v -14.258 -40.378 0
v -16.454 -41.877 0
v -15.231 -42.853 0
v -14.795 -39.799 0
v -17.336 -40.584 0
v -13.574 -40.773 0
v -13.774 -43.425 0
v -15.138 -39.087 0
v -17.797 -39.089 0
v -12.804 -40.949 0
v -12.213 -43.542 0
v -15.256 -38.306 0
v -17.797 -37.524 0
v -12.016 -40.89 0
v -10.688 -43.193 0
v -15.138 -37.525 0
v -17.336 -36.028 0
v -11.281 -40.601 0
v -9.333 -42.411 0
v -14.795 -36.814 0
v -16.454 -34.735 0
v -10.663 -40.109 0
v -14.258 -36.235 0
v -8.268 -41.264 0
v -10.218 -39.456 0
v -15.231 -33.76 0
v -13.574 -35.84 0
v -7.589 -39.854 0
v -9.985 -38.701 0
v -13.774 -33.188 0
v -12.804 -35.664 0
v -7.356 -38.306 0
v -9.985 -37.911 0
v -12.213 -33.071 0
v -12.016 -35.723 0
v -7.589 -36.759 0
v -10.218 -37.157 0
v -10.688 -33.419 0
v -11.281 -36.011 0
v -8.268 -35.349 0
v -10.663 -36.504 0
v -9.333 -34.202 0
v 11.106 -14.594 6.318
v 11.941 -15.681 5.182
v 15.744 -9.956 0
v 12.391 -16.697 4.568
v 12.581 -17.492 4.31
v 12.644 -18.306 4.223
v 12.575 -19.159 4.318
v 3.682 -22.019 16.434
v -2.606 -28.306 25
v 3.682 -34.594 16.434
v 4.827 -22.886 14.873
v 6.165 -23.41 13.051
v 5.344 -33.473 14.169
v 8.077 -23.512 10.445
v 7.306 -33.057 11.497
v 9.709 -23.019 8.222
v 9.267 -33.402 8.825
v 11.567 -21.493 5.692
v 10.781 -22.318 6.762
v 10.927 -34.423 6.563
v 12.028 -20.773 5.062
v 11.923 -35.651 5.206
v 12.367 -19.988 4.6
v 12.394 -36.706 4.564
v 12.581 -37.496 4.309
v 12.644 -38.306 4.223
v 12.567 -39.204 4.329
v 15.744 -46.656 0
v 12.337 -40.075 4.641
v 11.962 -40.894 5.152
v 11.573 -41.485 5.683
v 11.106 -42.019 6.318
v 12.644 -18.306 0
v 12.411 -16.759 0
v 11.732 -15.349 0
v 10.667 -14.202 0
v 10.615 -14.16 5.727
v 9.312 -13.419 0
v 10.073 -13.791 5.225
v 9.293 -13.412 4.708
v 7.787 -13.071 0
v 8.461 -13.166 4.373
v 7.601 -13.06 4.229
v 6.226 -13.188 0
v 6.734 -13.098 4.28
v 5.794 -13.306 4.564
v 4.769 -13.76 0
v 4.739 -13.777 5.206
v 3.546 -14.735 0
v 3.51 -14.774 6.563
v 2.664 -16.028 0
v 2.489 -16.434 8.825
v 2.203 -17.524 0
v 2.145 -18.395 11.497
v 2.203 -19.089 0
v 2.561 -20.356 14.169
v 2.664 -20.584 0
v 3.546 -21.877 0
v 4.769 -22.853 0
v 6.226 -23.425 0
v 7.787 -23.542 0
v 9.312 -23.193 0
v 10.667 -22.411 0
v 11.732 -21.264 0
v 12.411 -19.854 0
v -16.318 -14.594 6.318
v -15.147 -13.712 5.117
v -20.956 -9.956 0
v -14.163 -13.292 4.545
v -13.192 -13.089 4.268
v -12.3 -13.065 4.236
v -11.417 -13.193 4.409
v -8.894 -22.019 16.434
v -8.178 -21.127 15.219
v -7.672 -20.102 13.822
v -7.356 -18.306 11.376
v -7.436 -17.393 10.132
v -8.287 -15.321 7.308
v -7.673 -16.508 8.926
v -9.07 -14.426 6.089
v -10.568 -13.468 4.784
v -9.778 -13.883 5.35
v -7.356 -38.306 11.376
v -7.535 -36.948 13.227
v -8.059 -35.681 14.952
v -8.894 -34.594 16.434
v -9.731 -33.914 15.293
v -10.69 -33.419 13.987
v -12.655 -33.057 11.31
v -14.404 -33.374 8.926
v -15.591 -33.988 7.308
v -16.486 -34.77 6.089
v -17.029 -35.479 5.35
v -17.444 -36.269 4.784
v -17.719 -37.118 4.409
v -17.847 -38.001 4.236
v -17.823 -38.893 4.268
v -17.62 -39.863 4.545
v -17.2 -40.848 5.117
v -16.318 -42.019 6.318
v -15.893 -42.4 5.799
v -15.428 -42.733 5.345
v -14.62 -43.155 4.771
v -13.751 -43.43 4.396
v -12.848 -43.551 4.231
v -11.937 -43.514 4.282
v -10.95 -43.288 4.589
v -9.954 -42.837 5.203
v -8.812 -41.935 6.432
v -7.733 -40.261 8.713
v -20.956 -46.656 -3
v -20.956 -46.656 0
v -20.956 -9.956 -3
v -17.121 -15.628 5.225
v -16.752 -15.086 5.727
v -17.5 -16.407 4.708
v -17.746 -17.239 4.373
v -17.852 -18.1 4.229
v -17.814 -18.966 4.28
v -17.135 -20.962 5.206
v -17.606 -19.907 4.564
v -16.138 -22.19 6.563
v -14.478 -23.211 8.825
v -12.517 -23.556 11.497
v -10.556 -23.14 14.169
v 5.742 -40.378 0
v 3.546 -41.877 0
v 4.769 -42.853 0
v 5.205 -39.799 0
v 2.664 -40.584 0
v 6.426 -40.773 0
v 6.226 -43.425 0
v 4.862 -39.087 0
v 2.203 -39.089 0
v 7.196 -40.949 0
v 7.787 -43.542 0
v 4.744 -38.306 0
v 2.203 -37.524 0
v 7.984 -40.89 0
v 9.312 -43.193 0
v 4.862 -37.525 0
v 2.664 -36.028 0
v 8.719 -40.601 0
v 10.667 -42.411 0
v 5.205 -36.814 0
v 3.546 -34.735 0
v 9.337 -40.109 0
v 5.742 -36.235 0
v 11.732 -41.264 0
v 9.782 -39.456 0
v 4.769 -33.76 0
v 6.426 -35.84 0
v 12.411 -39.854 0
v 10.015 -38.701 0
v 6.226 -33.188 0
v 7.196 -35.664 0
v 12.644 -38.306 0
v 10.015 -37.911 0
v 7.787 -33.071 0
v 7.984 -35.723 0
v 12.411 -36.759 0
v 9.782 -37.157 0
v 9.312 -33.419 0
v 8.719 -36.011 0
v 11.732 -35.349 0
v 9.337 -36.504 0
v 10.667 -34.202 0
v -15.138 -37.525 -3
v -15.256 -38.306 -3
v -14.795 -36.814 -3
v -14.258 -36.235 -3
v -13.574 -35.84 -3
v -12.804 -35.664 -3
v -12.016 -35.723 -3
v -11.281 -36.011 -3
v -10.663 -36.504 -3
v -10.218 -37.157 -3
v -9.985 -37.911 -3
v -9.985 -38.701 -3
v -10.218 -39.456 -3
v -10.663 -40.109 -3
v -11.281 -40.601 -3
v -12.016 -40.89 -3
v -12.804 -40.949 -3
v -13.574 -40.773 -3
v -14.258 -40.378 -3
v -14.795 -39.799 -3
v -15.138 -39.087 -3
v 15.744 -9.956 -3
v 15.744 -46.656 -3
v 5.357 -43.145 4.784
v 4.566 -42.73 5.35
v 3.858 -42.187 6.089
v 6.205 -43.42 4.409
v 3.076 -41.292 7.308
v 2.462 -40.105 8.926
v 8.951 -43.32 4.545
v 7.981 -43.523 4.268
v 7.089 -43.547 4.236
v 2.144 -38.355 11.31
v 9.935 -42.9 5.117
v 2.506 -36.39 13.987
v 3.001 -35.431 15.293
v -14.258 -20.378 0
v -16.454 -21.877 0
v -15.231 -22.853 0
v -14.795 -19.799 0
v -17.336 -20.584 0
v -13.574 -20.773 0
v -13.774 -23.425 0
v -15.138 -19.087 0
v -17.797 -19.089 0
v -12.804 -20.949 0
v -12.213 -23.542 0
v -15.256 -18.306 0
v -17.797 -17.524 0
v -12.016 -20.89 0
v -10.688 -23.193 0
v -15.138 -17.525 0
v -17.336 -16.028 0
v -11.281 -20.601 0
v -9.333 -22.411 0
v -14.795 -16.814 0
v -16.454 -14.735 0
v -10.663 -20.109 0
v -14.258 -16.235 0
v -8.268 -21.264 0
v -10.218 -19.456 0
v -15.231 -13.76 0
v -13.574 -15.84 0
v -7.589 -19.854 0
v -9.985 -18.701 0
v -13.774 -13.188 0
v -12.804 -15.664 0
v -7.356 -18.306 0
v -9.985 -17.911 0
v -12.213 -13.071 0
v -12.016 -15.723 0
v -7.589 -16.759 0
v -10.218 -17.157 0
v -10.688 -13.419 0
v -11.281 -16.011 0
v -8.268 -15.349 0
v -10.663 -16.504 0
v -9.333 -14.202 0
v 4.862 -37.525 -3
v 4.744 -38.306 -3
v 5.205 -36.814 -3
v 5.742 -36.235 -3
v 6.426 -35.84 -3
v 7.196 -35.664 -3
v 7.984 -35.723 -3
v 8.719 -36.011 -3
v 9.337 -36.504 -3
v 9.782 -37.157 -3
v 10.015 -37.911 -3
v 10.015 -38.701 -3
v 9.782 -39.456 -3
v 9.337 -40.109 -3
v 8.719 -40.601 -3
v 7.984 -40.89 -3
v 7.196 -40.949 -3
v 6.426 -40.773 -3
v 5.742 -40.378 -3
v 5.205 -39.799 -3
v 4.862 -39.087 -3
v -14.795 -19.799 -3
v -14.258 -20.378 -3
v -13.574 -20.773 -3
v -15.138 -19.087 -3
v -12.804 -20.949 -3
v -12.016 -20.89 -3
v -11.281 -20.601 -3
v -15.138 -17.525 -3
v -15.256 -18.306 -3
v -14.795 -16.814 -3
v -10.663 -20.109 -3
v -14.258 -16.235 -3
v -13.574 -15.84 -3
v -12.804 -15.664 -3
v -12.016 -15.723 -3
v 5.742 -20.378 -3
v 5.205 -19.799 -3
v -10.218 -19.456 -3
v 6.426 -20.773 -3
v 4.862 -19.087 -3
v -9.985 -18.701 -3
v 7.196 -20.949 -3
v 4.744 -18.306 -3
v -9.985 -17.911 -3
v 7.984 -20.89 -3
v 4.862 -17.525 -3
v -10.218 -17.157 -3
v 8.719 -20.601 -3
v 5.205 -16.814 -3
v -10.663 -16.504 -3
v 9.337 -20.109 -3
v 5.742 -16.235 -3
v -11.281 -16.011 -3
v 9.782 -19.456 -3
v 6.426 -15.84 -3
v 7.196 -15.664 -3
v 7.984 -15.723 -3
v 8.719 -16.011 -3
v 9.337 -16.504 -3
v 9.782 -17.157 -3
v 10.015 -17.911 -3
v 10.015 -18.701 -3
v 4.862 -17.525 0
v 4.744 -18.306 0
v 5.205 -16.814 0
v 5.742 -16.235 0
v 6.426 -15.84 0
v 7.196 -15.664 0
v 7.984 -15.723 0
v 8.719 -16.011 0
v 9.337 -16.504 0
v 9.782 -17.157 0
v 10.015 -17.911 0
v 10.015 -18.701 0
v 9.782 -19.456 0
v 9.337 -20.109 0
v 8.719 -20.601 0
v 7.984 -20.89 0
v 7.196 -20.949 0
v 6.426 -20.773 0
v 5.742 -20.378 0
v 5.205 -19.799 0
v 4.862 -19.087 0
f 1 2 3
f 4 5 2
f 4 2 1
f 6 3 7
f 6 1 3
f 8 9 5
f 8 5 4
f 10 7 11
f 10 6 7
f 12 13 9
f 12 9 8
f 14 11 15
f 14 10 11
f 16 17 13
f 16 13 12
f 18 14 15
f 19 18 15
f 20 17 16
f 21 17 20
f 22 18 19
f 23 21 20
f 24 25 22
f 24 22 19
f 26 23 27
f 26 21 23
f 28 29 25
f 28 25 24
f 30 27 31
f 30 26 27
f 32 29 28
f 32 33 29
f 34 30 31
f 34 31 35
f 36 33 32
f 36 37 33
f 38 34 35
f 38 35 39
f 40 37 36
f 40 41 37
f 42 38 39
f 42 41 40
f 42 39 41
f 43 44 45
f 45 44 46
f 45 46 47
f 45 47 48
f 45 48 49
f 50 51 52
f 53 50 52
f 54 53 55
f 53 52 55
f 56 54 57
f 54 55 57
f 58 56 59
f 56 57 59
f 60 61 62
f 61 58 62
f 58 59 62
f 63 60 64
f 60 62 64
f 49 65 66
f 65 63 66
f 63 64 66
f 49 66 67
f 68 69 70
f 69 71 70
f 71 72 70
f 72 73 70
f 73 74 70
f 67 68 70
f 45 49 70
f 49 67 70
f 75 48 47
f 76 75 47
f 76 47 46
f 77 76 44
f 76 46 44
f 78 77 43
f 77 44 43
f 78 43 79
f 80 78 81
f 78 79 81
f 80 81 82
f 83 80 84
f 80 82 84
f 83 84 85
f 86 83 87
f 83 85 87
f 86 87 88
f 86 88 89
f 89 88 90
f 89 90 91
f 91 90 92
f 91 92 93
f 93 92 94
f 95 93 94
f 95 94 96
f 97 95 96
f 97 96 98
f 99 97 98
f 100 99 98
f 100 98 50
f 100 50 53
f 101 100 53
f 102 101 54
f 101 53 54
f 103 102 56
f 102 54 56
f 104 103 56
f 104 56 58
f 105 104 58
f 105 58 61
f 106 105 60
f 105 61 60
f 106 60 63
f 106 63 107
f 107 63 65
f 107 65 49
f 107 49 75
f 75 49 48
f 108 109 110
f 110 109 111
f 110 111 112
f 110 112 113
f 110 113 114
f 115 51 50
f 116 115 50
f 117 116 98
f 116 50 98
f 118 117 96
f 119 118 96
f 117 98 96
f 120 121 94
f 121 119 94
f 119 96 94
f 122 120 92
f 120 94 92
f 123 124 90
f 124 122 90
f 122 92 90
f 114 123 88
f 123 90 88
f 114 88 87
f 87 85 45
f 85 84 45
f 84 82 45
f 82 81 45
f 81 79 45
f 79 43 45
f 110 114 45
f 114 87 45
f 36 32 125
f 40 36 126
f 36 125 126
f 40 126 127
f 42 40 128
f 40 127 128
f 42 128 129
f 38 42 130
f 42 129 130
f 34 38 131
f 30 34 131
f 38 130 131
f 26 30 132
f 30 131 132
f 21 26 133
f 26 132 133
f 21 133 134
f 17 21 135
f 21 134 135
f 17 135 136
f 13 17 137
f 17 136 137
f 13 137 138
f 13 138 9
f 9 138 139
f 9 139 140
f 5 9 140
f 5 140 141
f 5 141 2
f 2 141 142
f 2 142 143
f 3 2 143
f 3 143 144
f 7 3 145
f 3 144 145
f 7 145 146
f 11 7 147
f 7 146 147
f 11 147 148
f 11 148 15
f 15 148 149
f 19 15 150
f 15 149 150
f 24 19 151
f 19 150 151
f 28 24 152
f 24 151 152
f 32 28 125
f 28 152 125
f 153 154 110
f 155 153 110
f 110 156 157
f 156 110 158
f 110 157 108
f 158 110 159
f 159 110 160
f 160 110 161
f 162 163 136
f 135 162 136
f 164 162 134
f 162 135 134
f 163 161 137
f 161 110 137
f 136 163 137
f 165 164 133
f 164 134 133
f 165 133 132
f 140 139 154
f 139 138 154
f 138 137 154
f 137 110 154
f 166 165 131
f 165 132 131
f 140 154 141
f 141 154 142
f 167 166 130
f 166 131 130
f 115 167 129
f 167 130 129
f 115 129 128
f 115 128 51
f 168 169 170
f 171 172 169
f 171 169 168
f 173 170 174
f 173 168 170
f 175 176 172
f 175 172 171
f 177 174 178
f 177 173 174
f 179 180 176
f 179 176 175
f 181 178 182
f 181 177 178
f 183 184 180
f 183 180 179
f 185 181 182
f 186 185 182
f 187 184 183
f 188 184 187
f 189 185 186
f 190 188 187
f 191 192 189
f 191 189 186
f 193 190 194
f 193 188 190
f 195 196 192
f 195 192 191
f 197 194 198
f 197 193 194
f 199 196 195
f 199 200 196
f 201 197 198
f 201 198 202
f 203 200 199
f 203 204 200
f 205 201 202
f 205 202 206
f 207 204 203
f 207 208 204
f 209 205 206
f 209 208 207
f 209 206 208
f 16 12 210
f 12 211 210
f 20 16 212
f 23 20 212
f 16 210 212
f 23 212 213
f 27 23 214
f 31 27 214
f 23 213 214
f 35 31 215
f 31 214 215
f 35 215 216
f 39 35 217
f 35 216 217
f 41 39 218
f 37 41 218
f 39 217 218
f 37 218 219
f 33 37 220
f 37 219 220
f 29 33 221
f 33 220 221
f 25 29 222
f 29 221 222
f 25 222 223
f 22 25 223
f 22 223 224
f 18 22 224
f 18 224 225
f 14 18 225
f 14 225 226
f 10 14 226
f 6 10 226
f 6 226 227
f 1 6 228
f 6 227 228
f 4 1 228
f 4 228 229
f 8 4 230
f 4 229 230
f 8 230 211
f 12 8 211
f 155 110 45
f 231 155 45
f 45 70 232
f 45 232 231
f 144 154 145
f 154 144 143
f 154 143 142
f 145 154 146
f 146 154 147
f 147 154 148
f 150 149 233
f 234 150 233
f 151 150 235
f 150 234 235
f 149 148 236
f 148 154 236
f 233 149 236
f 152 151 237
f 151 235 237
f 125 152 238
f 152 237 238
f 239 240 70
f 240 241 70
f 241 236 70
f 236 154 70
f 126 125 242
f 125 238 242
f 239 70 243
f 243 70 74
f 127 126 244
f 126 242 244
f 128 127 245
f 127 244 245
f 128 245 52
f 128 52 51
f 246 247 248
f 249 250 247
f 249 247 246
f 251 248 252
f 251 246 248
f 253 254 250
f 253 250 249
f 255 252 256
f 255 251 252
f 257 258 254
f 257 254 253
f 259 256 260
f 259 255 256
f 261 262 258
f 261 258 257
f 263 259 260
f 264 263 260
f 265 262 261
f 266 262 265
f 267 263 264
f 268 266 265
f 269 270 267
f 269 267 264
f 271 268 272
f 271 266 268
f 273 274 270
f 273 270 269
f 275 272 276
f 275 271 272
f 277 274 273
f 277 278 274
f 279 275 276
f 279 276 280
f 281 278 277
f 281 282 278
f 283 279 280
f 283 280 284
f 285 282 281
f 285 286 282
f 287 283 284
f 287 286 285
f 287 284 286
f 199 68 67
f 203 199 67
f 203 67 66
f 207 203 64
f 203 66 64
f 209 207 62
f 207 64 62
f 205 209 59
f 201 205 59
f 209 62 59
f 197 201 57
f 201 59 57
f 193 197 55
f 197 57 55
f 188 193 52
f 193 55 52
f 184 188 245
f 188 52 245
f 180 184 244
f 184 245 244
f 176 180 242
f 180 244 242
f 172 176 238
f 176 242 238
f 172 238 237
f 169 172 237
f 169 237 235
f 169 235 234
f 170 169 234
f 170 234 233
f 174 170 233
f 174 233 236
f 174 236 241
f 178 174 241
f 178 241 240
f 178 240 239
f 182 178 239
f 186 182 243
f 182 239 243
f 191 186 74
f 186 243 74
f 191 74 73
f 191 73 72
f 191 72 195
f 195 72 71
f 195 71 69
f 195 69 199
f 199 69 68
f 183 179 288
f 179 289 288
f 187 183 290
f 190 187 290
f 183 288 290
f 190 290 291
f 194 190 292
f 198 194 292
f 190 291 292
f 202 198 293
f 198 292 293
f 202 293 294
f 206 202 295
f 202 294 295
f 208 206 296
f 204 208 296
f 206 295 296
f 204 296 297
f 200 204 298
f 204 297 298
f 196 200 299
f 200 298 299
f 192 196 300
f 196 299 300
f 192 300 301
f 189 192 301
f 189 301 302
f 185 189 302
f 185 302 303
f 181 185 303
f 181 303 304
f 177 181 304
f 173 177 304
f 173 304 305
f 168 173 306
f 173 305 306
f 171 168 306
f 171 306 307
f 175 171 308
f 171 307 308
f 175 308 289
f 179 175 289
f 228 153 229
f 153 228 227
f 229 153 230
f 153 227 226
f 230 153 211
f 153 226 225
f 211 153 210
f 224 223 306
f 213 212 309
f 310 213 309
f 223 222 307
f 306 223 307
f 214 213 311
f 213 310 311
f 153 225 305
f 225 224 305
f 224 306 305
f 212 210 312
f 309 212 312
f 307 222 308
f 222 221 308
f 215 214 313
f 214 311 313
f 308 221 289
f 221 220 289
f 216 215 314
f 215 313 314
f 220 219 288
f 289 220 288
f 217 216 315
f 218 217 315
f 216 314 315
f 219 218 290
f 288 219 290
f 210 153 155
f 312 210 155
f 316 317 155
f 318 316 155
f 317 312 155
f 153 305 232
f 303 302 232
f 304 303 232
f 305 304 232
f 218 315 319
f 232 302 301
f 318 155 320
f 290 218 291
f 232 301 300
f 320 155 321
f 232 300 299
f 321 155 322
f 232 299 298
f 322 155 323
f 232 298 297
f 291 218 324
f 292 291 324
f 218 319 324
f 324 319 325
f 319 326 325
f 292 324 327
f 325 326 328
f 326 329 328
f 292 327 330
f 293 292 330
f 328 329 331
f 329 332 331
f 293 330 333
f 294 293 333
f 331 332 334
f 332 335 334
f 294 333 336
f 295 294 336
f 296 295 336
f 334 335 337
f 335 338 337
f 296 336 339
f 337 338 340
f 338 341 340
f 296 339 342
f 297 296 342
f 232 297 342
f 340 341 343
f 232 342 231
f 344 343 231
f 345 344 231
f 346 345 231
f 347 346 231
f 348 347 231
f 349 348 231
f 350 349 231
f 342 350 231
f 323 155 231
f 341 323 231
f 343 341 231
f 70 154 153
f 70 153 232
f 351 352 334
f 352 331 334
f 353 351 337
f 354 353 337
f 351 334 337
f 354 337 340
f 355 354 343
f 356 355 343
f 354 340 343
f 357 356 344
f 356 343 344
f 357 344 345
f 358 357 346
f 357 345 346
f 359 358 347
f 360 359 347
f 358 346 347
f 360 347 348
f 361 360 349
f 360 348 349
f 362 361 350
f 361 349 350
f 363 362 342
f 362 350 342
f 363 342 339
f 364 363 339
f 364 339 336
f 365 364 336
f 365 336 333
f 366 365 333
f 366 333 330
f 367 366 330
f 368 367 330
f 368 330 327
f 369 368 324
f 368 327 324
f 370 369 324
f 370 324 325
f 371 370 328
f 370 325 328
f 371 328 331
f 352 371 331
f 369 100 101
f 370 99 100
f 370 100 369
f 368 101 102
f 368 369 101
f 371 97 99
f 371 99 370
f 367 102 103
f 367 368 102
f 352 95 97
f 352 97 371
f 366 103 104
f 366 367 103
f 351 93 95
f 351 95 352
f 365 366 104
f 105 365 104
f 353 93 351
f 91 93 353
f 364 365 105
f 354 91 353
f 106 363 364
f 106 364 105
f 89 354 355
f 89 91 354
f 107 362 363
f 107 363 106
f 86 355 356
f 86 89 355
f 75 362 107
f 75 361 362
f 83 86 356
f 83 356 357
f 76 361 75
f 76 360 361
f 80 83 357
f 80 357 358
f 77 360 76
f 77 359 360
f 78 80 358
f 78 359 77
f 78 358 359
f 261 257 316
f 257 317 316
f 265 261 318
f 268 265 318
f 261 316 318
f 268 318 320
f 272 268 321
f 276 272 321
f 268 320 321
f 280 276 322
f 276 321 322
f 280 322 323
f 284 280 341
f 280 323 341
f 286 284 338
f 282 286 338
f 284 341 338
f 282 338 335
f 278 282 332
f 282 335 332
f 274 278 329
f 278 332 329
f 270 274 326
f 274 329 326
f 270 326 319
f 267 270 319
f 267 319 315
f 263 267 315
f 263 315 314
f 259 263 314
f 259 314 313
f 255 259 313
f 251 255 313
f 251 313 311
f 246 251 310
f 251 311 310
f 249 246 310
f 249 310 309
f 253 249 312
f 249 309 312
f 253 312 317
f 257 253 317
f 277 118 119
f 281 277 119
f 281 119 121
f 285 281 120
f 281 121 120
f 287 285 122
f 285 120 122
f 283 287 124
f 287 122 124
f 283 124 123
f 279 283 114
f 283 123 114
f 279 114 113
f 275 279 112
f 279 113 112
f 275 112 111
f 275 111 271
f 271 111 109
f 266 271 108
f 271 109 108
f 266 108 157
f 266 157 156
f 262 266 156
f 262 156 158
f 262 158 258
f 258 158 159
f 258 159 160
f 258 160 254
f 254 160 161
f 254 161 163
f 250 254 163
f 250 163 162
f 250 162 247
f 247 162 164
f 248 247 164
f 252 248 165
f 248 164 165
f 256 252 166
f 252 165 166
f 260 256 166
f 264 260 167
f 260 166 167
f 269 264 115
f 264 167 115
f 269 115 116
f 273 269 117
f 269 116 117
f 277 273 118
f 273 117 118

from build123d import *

# Parameters (mm, degrees)
F0_W           = 36.7
F0_H           = 36.7
F0_R           = 5.25
F0_R_2         = 2.65
F1_DEPTH       = 25
F3_DEPTH       = 36.701
F5_DEPTH       = 43.2
F6_DEPTH       = 3
F9_D           = 5.3
F9_DEPTH       = 55
F9_CBORE_D     = 10.5
F9_CBORE_DEPTH = 50
F9_TIP         = 1.5922806404


with BuildPart() as f1:
    # F0 (on Top) → F1 (new body)
    with BuildSketch(Plane.XY):
        with Locations((-2.6058288604, -28.3063627124)):
            Rectangle(F0_W, F0_H)
        with Locations((-12.6058288604, -38.3063627124)):
            Circle(F0_R, mode=Mode.SUBTRACT)
        with Locations((7.3941711396, -38.3063627124)):
            Circle(F0_R, mode=Mode.SUBTRACT)
        with Locations((-12.6058288604, -18.3063627124)):
            Circle(F0_R, mode=Mode.SUBTRACT)
        with Locations((7.3941711396, -18.3063627124)):
            Circle(F0_R, mode=Mode.SUBTRACT)
        with Locations((-12.6058288604, -38.3063627124)):
            Circle(F0_R)
        with Locations((-12.6058288604, -38.3063627124)):
            Circle(F0_R_2, mode=Mode.SUBTRACT)
        with Locations((-12.6058288604, -38.3063627124)):
            Circle(F0_R_2)
        with Locations((7.3941711396, -38.3063627124)):
            Circle(F0_R)
        with Locations((7.3941711396, -38.3063627124)):
            Circle(F0_R_2, mode=Mode.SUBTRACT)
        with Locations((7.3941711396, -38.3063627124)):
            Circle(F0_R_2)
        with Locations((7.3941711396, -18.3063627124)):
            Circle(F0_R)
        with Locations((7.3941711396, -18.3063627124)):
            Circle(F0_R_2, mode=Mode.SUBTRACT)
        with Locations((7.3941711396, -18.3063627124)):
            Circle(F0_R_2)
        with Locations((-12.6058288604, -18.3063627124)):
            Circle(F0_R)
        with Locations((-12.6058288604, -18.3063627124)):
            Circle(F0_R_2, mode=Mode.SUBTRACT)
        with Locations((-12.6058288604, -18.3063627124)):
            Circle(F0_R_2)
    extrude(amount=F1_DEPTH)

    # F2 (on face) → F3 (cut, through all)
    with BuildSketch(Plane.XZ.offset(46.6563627124)):
        Polygon((-20.9558288604, 0), (-2.6058288604, 25), (-20.9558288604, 25), align=None)
        Polygon((15.7441711396, 25), (-2.6058288604, 25), (15.7441711396, 0), align=None)
    extrude(amount=-F3_DEPTH, mode=Mode.SUBTRACT)

    # F4 (on Right) → F5 (cut, symmetric)
    with BuildSketch(Plane.YZ):
        Polygon((-46.6563627124, 0), (-28.3063627124, 25), (-46.6563627124, 25), align=None)
        Polygon((-9.9563627124, 25), (-28.3063627124, 25), (-9.9563627124, 0), align=None)
    extrude(amount=F5_DEPTH, both=True, mode=Mode.SUBTRACT)

    # F6 (add): a face of the model
    f6_faces = [f1.faces().sort_by_distance(p)[0] for p in [
        (-2.6058288604, -28.3063627124, 0),
    ]]
    extrude(f6_faces, amount=F6_DEPTH)

    # F9
    with Locations(Plane.XY.offset(50)):
        with Locations((-12.6058288604, -38.3063627124), (-12.6058288604, -18.3063627124), (7.3941711396, -18.3063627124), (7.3941711396, -38.3063627124)):
            CounterBoreHole(F9_D / 2, F9_CBORE_D / 2, F9_CBORE_DEPTH, depth=F9_DEPTH)
            with Locations((0, 0, -(F9_DEPTH + F9_TIP / 2))):  # 118° drill point
                Cone(0, F9_D / 2, F9_TIP, mode=Mode.SUBTRACT)


solid = f1.part
